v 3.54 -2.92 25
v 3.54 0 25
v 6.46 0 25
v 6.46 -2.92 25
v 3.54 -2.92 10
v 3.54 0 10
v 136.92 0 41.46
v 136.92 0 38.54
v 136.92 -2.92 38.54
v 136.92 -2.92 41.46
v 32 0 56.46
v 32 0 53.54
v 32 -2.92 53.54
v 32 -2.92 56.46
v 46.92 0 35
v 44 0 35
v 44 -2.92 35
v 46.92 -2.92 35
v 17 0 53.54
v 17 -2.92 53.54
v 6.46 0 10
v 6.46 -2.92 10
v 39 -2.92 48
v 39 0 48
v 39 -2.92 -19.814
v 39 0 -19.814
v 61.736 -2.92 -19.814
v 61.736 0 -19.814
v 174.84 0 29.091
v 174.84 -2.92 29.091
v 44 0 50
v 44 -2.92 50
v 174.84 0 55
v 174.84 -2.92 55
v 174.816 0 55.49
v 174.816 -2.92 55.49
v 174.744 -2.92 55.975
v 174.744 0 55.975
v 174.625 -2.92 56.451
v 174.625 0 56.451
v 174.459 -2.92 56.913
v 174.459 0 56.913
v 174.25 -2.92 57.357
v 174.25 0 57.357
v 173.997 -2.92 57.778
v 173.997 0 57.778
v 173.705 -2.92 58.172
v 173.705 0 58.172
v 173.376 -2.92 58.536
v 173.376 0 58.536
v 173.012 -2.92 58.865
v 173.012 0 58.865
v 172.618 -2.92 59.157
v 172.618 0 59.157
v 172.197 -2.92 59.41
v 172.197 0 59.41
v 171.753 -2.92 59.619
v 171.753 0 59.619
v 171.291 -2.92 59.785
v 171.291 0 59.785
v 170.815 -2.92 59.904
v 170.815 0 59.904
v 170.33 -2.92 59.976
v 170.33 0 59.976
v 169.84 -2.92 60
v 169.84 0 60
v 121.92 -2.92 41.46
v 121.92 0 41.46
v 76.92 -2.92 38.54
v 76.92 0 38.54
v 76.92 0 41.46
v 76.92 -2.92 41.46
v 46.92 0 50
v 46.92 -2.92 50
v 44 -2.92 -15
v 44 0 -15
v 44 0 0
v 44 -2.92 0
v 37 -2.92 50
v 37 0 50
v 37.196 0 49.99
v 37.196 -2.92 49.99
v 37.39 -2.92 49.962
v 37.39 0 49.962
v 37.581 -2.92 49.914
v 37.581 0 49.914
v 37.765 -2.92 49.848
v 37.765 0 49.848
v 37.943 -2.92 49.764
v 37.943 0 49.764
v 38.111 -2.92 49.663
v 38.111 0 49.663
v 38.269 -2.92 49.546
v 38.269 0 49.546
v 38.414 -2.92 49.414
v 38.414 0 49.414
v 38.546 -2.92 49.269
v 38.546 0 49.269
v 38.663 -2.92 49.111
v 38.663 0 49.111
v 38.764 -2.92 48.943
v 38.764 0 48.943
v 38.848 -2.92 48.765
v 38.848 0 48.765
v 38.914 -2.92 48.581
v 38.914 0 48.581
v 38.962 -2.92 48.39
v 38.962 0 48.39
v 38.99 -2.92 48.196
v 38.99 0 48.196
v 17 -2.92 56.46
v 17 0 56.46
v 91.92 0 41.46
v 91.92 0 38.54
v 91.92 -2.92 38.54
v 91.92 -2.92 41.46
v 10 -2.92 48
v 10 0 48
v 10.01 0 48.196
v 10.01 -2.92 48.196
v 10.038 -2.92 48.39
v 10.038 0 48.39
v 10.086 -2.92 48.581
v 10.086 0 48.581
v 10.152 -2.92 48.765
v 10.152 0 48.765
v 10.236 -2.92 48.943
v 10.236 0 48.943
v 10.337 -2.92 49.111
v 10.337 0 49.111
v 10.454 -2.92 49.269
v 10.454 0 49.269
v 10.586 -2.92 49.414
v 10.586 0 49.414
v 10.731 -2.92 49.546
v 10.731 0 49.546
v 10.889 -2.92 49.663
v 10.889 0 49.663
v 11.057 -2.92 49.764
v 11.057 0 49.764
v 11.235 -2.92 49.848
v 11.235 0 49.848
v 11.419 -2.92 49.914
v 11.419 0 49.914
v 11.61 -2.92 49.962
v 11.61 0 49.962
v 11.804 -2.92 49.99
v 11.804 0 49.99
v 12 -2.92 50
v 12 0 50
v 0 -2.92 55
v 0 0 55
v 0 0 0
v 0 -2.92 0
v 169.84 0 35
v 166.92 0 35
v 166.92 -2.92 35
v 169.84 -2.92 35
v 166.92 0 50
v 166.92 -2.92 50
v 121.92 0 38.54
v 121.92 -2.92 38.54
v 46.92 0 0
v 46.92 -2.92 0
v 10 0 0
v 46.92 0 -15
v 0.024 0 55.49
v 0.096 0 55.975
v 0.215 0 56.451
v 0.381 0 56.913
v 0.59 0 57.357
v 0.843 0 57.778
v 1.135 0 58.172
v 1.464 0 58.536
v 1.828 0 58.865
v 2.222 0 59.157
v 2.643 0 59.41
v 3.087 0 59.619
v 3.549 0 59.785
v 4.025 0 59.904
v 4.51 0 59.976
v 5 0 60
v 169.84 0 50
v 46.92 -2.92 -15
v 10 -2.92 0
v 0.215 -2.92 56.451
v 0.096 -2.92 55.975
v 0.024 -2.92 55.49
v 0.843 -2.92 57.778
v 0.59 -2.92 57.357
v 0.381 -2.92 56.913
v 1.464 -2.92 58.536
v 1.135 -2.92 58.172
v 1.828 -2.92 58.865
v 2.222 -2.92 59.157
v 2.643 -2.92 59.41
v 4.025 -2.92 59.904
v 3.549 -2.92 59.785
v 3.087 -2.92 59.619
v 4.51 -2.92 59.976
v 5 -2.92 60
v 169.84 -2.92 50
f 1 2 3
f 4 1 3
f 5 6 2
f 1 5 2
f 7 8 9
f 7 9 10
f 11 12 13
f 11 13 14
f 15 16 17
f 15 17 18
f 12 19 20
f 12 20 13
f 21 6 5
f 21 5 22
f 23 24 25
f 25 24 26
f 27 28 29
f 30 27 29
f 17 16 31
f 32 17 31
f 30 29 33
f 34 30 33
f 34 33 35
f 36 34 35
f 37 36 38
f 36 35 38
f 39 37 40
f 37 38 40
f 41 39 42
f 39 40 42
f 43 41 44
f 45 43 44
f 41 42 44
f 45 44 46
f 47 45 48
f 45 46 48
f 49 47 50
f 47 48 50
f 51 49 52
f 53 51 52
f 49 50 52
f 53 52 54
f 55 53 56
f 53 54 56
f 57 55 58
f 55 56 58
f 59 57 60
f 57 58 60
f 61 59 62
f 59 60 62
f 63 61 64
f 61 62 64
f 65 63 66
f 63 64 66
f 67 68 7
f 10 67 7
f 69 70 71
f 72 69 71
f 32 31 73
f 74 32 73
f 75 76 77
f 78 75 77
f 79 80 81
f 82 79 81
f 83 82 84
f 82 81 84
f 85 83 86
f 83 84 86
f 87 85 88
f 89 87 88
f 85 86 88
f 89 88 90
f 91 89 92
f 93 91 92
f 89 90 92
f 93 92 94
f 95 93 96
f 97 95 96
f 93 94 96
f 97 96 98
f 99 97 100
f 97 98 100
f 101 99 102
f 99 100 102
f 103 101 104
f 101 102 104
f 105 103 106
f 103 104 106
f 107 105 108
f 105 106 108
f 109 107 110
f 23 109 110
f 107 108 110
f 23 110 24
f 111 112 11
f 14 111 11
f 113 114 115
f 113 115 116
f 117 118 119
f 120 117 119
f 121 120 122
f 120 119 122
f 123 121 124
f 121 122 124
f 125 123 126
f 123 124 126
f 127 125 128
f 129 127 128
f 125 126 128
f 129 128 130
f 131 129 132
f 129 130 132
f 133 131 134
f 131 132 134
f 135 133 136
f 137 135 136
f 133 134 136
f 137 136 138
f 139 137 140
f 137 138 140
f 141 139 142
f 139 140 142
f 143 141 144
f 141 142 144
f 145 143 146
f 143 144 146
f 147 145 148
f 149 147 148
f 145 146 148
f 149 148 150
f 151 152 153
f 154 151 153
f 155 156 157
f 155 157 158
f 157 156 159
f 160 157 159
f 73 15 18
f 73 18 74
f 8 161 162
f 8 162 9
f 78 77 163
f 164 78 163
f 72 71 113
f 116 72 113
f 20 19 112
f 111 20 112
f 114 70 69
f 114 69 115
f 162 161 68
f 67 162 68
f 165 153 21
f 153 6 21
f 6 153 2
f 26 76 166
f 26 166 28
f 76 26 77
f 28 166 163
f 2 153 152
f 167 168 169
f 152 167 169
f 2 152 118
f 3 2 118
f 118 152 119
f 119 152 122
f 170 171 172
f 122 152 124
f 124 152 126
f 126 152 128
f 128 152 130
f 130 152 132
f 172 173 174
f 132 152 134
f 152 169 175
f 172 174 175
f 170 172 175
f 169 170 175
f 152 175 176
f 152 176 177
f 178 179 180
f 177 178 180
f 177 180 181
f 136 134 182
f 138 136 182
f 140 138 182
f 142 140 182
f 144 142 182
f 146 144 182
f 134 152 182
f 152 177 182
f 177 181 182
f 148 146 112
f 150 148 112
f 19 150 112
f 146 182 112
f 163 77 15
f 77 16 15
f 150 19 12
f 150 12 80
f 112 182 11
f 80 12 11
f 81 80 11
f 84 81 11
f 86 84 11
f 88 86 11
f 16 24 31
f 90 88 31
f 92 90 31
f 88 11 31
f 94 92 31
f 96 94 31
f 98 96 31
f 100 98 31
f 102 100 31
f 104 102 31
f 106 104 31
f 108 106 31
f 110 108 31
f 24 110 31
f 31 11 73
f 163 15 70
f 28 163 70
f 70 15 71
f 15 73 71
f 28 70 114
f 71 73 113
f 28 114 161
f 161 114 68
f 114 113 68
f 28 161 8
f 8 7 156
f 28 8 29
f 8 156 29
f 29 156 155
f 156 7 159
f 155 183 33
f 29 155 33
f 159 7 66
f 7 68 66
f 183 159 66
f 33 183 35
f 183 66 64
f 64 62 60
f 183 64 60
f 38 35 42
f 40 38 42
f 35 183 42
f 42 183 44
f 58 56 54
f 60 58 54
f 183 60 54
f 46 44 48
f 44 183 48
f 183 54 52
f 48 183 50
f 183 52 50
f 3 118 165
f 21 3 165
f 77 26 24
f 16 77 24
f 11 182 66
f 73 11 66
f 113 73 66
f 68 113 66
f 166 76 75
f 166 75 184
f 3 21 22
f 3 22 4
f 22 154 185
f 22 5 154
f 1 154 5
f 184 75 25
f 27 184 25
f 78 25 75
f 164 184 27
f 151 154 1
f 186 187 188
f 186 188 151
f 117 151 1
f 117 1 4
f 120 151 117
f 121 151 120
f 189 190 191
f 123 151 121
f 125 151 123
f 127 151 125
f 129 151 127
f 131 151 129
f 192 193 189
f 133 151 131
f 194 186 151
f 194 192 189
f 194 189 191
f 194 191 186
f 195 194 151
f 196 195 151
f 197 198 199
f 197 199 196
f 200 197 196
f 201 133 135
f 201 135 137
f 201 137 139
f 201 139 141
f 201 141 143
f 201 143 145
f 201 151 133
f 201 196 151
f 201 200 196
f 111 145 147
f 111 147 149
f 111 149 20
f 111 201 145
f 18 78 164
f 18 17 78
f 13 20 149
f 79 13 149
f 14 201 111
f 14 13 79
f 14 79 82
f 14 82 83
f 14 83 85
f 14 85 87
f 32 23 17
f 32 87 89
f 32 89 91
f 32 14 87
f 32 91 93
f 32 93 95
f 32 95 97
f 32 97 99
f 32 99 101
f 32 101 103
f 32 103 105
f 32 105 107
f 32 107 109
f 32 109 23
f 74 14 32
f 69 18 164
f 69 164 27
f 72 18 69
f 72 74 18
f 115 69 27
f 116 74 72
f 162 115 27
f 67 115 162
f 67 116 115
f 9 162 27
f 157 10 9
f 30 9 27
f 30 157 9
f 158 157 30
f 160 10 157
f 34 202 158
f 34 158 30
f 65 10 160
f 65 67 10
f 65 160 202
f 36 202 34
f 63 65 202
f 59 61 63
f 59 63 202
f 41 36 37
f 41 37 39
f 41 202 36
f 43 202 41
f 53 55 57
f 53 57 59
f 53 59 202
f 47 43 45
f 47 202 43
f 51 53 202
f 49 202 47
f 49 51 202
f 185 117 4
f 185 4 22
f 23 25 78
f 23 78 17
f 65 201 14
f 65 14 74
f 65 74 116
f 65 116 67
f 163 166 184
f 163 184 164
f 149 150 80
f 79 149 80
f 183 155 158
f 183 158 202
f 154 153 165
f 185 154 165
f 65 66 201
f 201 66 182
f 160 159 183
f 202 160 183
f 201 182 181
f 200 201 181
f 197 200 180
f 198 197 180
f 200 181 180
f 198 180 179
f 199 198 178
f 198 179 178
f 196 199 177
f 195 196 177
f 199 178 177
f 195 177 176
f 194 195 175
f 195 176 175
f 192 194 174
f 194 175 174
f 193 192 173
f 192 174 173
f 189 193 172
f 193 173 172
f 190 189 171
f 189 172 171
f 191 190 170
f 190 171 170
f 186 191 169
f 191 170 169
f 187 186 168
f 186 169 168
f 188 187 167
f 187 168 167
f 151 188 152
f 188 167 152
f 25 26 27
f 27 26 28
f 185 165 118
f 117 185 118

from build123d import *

# Parameters (mm, degrees)
F1_W     = 2.92
F1_H     = 15
F1_W_2   = 15
F1_H_2   = 2.92
F2_DEPTH = 2.92


with BuildPart() as f2:
    # F1 (on Front) → F2 (new body)
    with BuildSketch(Plane.XZ):
        with BuildLine():
            Line((0, 55), (0, 0))
            Line((0, 0), (10, 0))
            Line((10, 0), (10, 48))
            ThreePointArc((10, 48), (10.5857864376, 49.4142135624), (12, 50))
            Line((12, 50), (37, 50))
            ThreePointArc((37, 50), (38.4142135624, 49.4142135624), (39, 48))
            Line((39, 48), (39, -19.8143487114))
            Line((39, -19.8143487114), (61.7363576694, -19.8143487114))
            Line((61.7363576694, -19.8143487114), (174.84, 29.0905267951))
            Line((174.84, 29.0905267951), (174.84, 55))
            ThreePointArc((174.84, 55), (173.3755339059, 58.5355339059), (169.84, 60))
            Line((169.84, 60), (5, 60))
            ThreePointArc((5, 60), (1.4644660941, 58.5355339059), (0, 55))
        make_face()
        with Locations((45.46, -7.5)):
            Rectangle(F1_W, F1_H, mode=Mode.SUBTRACT)
        with Locations((5, 17.5)):
            Rectangle(F1_W, F1_H, mode=Mode.SUBTRACT)
        with Locations((84.42, 40)):
            Rectangle(F1_W_2, F1_H_2, mode=Mode.SUBTRACT)
        with Locations((24.5, 55)):
            Rectangle(F1_W_2, F1_H_2, mode=Mode.SUBTRACT)
        with Locations((45.46, 42.5)):
            Rectangle(F1_W, F1_H, mode=Mode.SUBTRACT)
        with Locations((129.42, 40)):
            Rectangle(F1_W_2, F1_H_2, mode=Mode.SUBTRACT)
        with Locations((168.38, 42.5)):
            Rectangle(F1_W, F1_H, mode=Mode.SUBTRACT)
    extrude(amount=F2_DEPTH)


solid = f2.part
